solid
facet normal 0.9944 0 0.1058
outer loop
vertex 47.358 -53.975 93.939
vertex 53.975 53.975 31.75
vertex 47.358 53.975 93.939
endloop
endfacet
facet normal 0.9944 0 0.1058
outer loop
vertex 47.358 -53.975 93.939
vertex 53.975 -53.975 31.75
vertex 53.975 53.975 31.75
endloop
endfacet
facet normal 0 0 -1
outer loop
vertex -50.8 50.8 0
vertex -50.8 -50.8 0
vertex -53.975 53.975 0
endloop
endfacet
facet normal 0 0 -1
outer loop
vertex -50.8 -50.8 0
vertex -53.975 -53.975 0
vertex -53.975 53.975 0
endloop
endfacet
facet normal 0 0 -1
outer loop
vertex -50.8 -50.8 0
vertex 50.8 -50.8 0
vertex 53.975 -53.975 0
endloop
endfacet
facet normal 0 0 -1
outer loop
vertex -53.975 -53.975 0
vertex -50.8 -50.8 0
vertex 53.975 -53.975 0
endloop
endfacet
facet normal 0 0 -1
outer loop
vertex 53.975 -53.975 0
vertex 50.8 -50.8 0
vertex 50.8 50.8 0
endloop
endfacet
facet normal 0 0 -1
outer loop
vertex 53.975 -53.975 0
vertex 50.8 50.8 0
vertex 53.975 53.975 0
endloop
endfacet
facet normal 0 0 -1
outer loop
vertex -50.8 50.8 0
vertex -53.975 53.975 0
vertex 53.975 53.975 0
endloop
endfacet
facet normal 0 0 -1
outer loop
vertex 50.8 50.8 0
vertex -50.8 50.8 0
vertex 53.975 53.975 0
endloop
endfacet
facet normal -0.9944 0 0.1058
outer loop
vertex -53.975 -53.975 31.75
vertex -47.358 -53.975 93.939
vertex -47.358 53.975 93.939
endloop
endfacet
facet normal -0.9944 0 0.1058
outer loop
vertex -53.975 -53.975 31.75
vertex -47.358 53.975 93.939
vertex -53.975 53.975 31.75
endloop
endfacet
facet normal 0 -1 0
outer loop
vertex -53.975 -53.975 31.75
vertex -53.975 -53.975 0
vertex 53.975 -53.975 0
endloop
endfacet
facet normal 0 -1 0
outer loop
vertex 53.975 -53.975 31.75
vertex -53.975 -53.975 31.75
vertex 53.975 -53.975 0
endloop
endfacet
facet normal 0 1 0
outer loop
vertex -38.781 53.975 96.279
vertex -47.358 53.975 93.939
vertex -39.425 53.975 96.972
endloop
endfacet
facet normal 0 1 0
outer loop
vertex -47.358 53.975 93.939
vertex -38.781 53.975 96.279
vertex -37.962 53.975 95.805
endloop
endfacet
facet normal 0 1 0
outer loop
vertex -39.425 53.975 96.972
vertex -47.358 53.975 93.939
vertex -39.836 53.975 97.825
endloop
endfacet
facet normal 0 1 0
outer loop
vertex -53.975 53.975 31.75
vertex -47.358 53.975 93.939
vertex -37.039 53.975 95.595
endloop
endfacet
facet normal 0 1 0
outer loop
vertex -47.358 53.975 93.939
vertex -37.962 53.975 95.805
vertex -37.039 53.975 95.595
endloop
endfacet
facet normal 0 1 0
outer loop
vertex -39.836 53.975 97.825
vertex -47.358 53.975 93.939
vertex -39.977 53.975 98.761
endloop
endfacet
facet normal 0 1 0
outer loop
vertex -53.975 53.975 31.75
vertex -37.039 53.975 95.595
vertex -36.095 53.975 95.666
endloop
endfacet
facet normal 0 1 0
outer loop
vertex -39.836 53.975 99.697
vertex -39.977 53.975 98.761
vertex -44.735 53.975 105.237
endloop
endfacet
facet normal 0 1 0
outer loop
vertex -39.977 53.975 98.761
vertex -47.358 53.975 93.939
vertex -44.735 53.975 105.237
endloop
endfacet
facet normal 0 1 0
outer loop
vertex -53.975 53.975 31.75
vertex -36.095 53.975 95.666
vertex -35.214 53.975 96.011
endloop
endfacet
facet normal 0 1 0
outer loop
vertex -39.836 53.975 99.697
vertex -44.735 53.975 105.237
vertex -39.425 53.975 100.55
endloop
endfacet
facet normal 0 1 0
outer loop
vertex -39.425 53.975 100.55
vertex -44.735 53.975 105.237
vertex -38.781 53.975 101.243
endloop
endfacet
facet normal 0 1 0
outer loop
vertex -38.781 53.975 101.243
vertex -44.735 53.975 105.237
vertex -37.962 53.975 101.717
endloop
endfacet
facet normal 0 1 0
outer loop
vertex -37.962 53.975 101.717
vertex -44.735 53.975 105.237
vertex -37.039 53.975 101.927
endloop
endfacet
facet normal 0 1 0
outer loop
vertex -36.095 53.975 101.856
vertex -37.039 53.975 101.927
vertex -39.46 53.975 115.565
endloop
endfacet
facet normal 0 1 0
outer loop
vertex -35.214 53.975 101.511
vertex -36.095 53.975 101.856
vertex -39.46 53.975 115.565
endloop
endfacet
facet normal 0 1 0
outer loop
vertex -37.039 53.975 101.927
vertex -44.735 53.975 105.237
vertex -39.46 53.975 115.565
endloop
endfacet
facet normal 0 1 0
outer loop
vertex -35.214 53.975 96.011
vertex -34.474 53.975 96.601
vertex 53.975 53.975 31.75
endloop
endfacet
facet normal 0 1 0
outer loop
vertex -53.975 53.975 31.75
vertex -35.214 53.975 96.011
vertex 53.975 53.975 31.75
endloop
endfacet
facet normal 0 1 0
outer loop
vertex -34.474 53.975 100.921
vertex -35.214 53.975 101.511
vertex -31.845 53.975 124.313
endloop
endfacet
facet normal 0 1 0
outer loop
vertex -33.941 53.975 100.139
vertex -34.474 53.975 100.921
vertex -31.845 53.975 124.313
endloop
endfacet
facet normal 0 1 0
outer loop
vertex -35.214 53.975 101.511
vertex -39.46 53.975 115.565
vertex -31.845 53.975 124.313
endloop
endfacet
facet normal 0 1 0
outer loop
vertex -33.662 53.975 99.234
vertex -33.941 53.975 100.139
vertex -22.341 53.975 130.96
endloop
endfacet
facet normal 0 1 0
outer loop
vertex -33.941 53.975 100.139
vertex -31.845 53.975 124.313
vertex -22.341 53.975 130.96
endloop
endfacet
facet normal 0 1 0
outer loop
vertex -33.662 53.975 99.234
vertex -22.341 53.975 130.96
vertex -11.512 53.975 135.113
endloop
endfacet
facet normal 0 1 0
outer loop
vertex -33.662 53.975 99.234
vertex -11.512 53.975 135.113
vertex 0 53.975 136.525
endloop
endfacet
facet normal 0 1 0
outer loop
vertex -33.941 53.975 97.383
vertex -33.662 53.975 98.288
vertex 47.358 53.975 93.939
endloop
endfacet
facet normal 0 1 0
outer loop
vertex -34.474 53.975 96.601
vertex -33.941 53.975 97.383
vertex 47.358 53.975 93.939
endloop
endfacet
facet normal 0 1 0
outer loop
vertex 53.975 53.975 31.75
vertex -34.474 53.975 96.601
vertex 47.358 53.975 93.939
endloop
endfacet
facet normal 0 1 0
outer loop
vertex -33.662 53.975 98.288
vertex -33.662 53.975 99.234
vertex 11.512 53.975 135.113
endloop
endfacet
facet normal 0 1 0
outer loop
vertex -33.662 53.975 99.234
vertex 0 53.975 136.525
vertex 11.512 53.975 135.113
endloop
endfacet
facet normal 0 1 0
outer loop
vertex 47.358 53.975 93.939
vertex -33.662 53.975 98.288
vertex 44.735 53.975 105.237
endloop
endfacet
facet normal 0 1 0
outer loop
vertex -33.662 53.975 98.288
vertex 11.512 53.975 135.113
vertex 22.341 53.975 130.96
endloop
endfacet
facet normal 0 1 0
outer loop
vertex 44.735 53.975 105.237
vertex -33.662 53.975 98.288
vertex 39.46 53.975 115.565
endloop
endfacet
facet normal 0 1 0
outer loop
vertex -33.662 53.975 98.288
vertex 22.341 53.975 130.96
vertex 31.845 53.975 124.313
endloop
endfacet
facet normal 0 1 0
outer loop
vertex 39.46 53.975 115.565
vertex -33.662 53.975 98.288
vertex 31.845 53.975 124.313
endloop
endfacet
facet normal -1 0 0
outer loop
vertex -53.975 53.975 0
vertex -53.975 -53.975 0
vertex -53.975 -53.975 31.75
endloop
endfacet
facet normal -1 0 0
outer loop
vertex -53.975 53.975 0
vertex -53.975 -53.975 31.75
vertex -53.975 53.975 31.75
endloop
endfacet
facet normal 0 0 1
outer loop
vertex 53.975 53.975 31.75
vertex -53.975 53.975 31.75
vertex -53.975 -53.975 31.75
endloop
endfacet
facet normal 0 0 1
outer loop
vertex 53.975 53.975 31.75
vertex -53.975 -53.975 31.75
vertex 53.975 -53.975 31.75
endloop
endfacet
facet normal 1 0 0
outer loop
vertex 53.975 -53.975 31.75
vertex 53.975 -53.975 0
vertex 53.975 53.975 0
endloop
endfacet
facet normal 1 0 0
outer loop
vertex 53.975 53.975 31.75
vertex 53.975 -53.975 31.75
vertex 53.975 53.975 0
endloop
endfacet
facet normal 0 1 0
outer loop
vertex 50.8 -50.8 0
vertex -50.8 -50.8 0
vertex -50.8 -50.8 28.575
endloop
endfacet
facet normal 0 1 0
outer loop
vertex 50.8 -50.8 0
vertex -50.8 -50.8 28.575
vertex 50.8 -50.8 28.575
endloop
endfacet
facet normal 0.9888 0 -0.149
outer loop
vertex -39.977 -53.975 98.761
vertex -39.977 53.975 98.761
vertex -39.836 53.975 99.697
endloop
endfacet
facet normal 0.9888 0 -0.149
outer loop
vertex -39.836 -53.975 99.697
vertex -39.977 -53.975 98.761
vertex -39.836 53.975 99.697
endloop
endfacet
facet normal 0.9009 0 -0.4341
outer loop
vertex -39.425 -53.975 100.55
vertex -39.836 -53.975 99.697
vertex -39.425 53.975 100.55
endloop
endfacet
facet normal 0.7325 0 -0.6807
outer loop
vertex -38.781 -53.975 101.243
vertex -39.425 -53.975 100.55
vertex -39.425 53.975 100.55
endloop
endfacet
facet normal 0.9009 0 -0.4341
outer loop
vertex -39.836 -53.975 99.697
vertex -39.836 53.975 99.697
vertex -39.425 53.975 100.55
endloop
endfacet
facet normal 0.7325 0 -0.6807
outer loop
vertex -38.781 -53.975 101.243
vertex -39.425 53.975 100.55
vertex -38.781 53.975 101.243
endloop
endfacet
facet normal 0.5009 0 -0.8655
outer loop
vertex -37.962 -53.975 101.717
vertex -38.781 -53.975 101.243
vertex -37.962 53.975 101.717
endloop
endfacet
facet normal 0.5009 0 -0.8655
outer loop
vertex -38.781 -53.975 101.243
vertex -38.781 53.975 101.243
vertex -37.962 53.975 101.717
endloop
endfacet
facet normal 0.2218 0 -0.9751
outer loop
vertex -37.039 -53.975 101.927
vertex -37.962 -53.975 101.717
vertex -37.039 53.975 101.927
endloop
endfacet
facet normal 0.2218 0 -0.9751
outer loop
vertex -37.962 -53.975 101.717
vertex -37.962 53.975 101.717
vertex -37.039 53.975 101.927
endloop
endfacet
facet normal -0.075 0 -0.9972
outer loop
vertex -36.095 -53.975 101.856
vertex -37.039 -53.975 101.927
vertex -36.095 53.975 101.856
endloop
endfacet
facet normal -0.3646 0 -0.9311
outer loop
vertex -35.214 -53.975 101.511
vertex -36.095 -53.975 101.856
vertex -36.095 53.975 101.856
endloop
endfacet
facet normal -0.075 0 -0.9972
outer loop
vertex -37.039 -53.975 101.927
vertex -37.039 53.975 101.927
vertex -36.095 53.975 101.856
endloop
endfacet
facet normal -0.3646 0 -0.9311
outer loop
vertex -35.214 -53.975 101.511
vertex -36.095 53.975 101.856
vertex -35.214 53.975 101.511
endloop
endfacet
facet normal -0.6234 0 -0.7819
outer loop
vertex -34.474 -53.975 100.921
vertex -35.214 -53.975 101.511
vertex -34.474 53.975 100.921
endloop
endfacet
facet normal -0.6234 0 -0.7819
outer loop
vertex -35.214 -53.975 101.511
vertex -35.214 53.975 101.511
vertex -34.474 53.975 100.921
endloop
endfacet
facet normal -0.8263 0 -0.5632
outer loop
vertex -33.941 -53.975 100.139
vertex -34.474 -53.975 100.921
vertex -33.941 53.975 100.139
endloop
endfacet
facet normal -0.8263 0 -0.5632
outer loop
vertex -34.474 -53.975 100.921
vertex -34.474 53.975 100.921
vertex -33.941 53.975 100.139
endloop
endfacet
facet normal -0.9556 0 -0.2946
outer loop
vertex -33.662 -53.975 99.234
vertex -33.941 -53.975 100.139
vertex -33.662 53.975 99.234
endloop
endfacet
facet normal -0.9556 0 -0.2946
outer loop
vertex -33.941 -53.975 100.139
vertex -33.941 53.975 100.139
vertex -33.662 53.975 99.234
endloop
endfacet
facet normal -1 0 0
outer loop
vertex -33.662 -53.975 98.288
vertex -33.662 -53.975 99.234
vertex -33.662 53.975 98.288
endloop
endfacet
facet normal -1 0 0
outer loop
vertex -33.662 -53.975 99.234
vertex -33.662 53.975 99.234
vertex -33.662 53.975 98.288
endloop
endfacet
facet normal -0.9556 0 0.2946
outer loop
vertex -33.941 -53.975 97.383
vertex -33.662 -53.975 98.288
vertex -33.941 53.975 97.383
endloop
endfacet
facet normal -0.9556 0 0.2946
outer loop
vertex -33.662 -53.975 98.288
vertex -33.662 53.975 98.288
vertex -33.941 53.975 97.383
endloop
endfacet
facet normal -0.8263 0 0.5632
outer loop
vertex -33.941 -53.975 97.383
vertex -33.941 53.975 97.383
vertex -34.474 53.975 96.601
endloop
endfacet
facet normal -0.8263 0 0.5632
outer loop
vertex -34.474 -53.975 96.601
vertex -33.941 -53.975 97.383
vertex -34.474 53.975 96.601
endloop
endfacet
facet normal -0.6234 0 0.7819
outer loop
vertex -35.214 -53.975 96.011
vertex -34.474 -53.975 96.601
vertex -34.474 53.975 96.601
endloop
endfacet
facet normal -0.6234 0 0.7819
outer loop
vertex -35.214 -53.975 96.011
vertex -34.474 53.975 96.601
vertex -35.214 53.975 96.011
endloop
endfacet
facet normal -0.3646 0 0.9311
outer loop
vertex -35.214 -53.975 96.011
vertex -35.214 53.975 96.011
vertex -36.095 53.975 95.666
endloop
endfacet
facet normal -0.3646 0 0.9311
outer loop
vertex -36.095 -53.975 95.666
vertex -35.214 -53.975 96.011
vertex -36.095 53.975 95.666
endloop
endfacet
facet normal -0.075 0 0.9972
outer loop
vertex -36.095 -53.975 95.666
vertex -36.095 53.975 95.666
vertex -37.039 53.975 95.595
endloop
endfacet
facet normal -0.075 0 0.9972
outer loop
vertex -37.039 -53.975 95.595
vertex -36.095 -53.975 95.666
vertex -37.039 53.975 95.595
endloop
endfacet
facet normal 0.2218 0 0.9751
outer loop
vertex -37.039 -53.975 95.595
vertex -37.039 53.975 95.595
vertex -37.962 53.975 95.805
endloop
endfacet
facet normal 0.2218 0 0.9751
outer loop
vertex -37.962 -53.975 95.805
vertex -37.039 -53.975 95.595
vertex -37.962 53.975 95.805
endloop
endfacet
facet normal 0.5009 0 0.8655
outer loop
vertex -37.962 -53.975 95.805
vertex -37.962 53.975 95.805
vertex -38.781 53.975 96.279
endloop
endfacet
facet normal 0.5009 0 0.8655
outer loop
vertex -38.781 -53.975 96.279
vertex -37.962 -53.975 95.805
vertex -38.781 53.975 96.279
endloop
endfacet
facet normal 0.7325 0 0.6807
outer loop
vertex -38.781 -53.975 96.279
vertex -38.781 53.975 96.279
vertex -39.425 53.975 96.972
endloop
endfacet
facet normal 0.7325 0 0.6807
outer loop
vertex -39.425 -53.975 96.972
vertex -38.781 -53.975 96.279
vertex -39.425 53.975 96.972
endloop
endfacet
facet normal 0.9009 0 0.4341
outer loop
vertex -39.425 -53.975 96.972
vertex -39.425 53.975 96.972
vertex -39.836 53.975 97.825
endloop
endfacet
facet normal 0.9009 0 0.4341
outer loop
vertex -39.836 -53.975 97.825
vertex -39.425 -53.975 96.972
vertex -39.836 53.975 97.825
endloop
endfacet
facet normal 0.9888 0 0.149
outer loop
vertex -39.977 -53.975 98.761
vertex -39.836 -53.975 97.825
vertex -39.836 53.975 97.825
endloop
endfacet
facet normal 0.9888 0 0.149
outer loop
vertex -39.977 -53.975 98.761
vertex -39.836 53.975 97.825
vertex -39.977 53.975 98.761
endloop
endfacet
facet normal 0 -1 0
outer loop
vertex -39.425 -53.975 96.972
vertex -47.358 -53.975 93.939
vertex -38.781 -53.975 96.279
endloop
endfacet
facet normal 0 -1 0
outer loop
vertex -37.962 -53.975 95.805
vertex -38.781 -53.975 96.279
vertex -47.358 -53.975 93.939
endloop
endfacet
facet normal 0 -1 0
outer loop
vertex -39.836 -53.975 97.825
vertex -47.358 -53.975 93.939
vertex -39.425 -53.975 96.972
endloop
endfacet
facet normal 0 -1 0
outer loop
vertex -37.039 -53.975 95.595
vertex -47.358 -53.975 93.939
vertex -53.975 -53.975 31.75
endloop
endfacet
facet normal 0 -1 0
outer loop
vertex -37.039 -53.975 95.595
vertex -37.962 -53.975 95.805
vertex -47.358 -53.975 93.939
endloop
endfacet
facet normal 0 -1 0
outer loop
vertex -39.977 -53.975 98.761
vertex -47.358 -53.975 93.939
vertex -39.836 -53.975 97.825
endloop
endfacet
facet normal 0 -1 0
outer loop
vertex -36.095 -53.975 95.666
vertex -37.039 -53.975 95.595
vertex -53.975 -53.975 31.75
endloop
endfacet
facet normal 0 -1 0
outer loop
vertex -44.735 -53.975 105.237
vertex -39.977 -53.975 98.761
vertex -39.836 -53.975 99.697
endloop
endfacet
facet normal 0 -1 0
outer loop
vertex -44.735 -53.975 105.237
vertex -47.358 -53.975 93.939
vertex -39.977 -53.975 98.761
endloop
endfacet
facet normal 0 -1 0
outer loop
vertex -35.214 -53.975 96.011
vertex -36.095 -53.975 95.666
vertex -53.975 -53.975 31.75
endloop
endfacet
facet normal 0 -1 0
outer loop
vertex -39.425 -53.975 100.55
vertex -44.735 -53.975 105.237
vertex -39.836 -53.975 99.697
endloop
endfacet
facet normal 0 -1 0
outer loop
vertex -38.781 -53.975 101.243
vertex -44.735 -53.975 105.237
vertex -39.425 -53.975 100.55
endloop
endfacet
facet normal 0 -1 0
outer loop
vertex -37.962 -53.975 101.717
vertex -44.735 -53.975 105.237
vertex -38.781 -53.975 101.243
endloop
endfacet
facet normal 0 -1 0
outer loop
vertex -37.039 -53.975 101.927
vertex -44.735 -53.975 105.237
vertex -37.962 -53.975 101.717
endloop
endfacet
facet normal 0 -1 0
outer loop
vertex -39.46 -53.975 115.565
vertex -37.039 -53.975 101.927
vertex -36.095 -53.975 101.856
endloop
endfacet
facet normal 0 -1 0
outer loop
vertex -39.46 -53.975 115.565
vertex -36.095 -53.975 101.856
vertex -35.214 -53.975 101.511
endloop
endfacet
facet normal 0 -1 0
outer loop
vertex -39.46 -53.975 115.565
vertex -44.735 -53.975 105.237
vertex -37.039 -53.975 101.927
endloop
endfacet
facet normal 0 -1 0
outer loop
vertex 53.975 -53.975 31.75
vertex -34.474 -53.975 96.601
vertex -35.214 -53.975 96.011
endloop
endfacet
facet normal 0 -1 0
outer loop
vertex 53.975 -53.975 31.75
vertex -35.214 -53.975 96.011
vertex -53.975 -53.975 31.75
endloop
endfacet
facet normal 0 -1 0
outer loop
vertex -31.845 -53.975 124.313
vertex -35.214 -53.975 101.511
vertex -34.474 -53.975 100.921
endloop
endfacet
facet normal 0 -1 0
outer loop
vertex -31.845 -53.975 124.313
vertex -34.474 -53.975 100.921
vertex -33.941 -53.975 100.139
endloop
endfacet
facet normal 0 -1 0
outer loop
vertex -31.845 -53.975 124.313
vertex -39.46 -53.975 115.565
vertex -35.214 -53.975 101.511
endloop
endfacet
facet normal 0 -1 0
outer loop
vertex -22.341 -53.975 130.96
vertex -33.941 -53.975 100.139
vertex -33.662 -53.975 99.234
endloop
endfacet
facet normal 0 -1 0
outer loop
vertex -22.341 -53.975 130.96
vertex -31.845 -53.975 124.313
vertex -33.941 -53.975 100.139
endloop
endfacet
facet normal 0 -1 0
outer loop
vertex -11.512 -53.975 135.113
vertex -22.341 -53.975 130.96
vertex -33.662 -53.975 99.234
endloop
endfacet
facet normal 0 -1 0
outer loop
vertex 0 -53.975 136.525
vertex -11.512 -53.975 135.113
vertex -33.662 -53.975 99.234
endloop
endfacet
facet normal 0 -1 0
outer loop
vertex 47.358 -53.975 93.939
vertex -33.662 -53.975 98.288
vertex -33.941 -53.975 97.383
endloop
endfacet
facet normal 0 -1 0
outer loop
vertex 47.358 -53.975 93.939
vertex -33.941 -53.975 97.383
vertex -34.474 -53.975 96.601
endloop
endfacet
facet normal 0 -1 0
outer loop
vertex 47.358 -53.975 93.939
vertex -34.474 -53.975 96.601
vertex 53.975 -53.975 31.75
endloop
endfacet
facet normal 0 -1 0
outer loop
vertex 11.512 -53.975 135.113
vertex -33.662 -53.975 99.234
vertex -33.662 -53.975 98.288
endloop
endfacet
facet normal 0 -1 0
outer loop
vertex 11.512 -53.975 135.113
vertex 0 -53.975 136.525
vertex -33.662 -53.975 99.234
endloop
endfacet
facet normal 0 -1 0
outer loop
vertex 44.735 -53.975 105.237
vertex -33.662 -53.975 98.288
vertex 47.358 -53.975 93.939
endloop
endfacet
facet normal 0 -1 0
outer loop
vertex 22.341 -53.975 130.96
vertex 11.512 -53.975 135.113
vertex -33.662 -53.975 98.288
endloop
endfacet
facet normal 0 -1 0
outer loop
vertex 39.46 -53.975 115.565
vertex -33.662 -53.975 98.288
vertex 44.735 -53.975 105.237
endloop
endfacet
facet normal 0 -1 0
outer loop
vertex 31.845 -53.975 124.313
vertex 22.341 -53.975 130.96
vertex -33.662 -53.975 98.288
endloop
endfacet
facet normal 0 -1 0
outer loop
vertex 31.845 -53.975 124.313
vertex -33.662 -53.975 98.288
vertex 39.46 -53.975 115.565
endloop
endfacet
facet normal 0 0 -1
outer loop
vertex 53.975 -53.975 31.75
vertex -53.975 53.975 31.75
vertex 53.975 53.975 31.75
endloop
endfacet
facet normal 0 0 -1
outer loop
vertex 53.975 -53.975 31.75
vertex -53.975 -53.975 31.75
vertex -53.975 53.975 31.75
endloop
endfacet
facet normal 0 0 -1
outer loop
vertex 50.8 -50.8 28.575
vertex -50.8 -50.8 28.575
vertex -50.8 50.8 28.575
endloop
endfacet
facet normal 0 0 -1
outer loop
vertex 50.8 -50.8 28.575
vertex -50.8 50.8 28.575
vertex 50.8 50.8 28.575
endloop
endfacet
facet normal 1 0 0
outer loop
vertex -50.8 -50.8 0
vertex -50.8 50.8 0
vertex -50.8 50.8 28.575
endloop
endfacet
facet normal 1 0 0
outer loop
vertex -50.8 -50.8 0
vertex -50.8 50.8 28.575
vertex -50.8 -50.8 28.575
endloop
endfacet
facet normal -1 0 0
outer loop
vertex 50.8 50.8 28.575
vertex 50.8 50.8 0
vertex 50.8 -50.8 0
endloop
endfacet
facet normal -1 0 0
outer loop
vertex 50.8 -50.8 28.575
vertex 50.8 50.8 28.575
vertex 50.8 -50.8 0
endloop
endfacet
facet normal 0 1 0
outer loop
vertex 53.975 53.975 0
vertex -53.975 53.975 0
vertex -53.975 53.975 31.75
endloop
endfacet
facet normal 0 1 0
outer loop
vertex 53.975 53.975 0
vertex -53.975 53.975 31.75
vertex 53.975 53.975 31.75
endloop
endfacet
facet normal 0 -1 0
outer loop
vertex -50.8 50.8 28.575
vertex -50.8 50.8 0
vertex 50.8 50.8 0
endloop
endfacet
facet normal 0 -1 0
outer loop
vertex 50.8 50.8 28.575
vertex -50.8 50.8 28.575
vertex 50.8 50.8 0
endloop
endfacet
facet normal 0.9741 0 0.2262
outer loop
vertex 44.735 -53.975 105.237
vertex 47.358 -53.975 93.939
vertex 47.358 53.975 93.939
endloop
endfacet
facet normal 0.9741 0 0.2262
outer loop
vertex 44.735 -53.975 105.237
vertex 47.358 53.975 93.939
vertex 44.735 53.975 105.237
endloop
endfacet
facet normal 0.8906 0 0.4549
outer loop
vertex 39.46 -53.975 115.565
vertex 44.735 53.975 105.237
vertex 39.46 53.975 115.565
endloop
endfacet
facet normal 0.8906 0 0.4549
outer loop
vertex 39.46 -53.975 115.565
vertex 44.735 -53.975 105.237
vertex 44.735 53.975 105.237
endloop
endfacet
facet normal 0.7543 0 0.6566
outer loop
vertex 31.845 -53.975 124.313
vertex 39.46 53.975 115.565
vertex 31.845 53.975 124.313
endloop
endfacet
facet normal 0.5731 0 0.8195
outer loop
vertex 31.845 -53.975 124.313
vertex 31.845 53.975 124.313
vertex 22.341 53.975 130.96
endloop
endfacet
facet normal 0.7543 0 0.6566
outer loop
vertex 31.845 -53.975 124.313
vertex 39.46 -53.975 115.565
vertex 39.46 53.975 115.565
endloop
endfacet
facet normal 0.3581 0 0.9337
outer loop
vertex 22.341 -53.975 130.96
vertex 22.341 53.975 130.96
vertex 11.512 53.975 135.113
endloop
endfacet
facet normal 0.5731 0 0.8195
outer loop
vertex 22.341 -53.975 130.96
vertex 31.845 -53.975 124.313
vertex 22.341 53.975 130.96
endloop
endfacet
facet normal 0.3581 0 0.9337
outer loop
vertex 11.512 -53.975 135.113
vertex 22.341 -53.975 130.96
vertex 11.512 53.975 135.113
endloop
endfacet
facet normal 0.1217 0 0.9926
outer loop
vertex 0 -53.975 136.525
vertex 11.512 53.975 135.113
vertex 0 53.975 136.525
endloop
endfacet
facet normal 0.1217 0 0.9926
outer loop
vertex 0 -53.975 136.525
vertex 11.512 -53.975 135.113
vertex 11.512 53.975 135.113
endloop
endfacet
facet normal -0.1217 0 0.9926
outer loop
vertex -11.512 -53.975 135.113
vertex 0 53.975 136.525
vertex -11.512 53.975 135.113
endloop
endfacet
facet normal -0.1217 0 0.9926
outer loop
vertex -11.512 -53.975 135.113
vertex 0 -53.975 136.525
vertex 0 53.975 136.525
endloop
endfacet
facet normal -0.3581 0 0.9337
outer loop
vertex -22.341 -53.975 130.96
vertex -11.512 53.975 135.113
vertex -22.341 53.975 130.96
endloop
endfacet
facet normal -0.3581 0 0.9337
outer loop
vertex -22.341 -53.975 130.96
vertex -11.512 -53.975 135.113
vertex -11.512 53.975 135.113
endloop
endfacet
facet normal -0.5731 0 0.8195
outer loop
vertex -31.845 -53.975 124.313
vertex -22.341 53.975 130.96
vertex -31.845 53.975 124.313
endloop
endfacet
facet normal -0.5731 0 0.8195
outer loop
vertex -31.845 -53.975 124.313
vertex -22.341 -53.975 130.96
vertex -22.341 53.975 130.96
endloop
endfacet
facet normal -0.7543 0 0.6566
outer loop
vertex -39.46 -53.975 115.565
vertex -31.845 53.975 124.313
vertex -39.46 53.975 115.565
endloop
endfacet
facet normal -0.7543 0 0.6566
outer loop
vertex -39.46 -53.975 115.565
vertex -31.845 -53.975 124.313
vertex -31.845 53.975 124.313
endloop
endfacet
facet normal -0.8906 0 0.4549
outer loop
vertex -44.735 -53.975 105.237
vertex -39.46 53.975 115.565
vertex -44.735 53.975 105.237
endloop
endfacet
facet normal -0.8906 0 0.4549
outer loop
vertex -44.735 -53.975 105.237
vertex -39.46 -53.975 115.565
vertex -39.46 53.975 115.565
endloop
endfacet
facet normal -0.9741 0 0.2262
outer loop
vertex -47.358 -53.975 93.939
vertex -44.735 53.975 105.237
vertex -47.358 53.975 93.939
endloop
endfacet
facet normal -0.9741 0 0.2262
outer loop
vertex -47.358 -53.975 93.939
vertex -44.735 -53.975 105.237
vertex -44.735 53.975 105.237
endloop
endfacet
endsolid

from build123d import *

# Parameters (mm, degrees)
F0_W     = 107.95
F0_H     = 107.95
F1_DEPTH = 31.75
F2_W     = 101.6
F2_H     = 101.6
F3_DEPTH = 28.575
F5_DEPTH = 53.975
F7_D     = 6.35


with BuildPart() as f1:
    # F0 (on Top) → F1 (new body)
    with BuildSketch(Plane.XY):
        Rectangle(F0_W, F0_H)
    extrude(amount=F1_DEPTH)

    # F2 (on face) → F3 (cut)
    with BuildSketch(Plane(origin=(0, 0, 0), x_dir=(1, 0, 0), z_dir=(0, 0, -1))):
        Rectangle(F2_W, F2_H)
    extrude(amount=-F3_DEPTH, mode=Mode.SUBTRACT)


with BuildPart() as f5:
    # F4 (on Front) → F5 (new body, symmetric)
    with BuildSketch(Plane.XZ):
        with BuildLine():
            Line((53.975, 31.75), (47.3576536724, 93.9391729128))
            ThreePointArc((47.3576536724, 93.9391729128), (0, 136.525), (-47.3576536724, 93.9391729128))
            Line((-47.3576536724, 93.9391729128), (-53.975, 31.75))
            Line((-53.975, 31.75), (53.975, 31.75))
        make_face()
    extrude(amount=F5_DEPTH, both=True)

    # F7 (through all)
    with Locations(Plane.XZ.offset(53.975)):
        with Locations((-36.8017739816, 98.7610056184)):
            Hole(F7_D / 2)


solid = Compound([f1.part, f5.part])
